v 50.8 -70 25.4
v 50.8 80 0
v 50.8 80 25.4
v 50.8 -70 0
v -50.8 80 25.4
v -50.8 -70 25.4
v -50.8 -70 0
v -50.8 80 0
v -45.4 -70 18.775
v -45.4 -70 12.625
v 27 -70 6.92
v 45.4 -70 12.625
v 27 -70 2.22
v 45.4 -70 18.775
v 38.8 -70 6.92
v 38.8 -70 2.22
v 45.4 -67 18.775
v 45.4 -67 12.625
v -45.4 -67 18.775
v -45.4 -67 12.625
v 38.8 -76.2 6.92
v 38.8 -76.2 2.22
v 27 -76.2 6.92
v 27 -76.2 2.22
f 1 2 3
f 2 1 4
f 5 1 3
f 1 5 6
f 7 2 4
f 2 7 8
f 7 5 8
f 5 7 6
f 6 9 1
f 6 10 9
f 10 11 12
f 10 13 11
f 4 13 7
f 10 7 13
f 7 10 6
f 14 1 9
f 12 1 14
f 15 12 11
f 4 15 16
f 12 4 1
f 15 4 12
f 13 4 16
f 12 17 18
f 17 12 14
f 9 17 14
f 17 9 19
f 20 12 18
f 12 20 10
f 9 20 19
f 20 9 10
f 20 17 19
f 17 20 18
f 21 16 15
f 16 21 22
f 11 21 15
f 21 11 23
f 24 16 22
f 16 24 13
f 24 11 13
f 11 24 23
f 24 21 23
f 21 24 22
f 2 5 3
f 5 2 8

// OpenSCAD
// file: configurations.scad
FloppyDrive_x_throws_gap = 94;
FloppyDrive_y_throws_gap = 70;

FloppyDrive_x_size = 101.6;
FloppyDrive_y_size = 150;
FloppyDrive_z_size = 25.4;

FloppyDrive_y_throw_facade_offset = 35;

FloppyDrive_button_x_size = 11.8;
FloppyDrive_button_y_size = 6.2;
FloppyDrive_button_z_size = 4.7;

FloppyDrive_button_right_x_offest = 12;
FloppyDrive_button_bottom_z_offest = 2.22;
// main file
include <./configurations.scad>


/**
 * FloppyDrive
 * @name FloppyDrive
 * @description FloppyDrive
 * @type asset
 * @parent
 */
module FloppyDrive() {

    x_throws_gap = 94;
    y_throws_gap = 70;

    x_size = 101.6;
    y_size = 150;
    z_size = 25.4;

    y_throw_facade_offset = 35;

    translate([
        0,
        y_size / 2 - y_throw_facade_offset - y_throws_gap / 2,
        z_size / 2
    ]) {

        facade_y_size = 4;
        translate([0, facade_y_size / 2, 0])
            cube([x_size, y_size - facade_y_size, z_size], center = true);

        translate([0, -y_size / 2 + facade_y_size / 2, 0]) {
            color("DarkSlateGray") {
                difference() {
                    cube([x_size, facade_y_size, z_size], center = true);

                    translate([0, -1, 3])
                    cube(
                        [
                            x_size - 5.4 * 2,
                            facade_y_size,
                            6.15
                        ],
                        center = true
                    );
                }

                button_x_size = 11.8;
                button_y_size = 6.2;
                button_z_size = 4.7;

                button_right_x_offest = 12;
                button_bottom_z_offest = 2.22;
                
                translate([
                    x_size / 2 - button_right_x_offest - button_x_size / 2,
                    -facade_y_size / 2 - button_y_size / 2,
                    -z_size / 2 + button_z_size / 2 + button_bottom_z_offest
                ])
                    cube([button_x_size, button_y_size, button_z_size], center = true);
            }
        }
    }
}


FloppyDrive();
